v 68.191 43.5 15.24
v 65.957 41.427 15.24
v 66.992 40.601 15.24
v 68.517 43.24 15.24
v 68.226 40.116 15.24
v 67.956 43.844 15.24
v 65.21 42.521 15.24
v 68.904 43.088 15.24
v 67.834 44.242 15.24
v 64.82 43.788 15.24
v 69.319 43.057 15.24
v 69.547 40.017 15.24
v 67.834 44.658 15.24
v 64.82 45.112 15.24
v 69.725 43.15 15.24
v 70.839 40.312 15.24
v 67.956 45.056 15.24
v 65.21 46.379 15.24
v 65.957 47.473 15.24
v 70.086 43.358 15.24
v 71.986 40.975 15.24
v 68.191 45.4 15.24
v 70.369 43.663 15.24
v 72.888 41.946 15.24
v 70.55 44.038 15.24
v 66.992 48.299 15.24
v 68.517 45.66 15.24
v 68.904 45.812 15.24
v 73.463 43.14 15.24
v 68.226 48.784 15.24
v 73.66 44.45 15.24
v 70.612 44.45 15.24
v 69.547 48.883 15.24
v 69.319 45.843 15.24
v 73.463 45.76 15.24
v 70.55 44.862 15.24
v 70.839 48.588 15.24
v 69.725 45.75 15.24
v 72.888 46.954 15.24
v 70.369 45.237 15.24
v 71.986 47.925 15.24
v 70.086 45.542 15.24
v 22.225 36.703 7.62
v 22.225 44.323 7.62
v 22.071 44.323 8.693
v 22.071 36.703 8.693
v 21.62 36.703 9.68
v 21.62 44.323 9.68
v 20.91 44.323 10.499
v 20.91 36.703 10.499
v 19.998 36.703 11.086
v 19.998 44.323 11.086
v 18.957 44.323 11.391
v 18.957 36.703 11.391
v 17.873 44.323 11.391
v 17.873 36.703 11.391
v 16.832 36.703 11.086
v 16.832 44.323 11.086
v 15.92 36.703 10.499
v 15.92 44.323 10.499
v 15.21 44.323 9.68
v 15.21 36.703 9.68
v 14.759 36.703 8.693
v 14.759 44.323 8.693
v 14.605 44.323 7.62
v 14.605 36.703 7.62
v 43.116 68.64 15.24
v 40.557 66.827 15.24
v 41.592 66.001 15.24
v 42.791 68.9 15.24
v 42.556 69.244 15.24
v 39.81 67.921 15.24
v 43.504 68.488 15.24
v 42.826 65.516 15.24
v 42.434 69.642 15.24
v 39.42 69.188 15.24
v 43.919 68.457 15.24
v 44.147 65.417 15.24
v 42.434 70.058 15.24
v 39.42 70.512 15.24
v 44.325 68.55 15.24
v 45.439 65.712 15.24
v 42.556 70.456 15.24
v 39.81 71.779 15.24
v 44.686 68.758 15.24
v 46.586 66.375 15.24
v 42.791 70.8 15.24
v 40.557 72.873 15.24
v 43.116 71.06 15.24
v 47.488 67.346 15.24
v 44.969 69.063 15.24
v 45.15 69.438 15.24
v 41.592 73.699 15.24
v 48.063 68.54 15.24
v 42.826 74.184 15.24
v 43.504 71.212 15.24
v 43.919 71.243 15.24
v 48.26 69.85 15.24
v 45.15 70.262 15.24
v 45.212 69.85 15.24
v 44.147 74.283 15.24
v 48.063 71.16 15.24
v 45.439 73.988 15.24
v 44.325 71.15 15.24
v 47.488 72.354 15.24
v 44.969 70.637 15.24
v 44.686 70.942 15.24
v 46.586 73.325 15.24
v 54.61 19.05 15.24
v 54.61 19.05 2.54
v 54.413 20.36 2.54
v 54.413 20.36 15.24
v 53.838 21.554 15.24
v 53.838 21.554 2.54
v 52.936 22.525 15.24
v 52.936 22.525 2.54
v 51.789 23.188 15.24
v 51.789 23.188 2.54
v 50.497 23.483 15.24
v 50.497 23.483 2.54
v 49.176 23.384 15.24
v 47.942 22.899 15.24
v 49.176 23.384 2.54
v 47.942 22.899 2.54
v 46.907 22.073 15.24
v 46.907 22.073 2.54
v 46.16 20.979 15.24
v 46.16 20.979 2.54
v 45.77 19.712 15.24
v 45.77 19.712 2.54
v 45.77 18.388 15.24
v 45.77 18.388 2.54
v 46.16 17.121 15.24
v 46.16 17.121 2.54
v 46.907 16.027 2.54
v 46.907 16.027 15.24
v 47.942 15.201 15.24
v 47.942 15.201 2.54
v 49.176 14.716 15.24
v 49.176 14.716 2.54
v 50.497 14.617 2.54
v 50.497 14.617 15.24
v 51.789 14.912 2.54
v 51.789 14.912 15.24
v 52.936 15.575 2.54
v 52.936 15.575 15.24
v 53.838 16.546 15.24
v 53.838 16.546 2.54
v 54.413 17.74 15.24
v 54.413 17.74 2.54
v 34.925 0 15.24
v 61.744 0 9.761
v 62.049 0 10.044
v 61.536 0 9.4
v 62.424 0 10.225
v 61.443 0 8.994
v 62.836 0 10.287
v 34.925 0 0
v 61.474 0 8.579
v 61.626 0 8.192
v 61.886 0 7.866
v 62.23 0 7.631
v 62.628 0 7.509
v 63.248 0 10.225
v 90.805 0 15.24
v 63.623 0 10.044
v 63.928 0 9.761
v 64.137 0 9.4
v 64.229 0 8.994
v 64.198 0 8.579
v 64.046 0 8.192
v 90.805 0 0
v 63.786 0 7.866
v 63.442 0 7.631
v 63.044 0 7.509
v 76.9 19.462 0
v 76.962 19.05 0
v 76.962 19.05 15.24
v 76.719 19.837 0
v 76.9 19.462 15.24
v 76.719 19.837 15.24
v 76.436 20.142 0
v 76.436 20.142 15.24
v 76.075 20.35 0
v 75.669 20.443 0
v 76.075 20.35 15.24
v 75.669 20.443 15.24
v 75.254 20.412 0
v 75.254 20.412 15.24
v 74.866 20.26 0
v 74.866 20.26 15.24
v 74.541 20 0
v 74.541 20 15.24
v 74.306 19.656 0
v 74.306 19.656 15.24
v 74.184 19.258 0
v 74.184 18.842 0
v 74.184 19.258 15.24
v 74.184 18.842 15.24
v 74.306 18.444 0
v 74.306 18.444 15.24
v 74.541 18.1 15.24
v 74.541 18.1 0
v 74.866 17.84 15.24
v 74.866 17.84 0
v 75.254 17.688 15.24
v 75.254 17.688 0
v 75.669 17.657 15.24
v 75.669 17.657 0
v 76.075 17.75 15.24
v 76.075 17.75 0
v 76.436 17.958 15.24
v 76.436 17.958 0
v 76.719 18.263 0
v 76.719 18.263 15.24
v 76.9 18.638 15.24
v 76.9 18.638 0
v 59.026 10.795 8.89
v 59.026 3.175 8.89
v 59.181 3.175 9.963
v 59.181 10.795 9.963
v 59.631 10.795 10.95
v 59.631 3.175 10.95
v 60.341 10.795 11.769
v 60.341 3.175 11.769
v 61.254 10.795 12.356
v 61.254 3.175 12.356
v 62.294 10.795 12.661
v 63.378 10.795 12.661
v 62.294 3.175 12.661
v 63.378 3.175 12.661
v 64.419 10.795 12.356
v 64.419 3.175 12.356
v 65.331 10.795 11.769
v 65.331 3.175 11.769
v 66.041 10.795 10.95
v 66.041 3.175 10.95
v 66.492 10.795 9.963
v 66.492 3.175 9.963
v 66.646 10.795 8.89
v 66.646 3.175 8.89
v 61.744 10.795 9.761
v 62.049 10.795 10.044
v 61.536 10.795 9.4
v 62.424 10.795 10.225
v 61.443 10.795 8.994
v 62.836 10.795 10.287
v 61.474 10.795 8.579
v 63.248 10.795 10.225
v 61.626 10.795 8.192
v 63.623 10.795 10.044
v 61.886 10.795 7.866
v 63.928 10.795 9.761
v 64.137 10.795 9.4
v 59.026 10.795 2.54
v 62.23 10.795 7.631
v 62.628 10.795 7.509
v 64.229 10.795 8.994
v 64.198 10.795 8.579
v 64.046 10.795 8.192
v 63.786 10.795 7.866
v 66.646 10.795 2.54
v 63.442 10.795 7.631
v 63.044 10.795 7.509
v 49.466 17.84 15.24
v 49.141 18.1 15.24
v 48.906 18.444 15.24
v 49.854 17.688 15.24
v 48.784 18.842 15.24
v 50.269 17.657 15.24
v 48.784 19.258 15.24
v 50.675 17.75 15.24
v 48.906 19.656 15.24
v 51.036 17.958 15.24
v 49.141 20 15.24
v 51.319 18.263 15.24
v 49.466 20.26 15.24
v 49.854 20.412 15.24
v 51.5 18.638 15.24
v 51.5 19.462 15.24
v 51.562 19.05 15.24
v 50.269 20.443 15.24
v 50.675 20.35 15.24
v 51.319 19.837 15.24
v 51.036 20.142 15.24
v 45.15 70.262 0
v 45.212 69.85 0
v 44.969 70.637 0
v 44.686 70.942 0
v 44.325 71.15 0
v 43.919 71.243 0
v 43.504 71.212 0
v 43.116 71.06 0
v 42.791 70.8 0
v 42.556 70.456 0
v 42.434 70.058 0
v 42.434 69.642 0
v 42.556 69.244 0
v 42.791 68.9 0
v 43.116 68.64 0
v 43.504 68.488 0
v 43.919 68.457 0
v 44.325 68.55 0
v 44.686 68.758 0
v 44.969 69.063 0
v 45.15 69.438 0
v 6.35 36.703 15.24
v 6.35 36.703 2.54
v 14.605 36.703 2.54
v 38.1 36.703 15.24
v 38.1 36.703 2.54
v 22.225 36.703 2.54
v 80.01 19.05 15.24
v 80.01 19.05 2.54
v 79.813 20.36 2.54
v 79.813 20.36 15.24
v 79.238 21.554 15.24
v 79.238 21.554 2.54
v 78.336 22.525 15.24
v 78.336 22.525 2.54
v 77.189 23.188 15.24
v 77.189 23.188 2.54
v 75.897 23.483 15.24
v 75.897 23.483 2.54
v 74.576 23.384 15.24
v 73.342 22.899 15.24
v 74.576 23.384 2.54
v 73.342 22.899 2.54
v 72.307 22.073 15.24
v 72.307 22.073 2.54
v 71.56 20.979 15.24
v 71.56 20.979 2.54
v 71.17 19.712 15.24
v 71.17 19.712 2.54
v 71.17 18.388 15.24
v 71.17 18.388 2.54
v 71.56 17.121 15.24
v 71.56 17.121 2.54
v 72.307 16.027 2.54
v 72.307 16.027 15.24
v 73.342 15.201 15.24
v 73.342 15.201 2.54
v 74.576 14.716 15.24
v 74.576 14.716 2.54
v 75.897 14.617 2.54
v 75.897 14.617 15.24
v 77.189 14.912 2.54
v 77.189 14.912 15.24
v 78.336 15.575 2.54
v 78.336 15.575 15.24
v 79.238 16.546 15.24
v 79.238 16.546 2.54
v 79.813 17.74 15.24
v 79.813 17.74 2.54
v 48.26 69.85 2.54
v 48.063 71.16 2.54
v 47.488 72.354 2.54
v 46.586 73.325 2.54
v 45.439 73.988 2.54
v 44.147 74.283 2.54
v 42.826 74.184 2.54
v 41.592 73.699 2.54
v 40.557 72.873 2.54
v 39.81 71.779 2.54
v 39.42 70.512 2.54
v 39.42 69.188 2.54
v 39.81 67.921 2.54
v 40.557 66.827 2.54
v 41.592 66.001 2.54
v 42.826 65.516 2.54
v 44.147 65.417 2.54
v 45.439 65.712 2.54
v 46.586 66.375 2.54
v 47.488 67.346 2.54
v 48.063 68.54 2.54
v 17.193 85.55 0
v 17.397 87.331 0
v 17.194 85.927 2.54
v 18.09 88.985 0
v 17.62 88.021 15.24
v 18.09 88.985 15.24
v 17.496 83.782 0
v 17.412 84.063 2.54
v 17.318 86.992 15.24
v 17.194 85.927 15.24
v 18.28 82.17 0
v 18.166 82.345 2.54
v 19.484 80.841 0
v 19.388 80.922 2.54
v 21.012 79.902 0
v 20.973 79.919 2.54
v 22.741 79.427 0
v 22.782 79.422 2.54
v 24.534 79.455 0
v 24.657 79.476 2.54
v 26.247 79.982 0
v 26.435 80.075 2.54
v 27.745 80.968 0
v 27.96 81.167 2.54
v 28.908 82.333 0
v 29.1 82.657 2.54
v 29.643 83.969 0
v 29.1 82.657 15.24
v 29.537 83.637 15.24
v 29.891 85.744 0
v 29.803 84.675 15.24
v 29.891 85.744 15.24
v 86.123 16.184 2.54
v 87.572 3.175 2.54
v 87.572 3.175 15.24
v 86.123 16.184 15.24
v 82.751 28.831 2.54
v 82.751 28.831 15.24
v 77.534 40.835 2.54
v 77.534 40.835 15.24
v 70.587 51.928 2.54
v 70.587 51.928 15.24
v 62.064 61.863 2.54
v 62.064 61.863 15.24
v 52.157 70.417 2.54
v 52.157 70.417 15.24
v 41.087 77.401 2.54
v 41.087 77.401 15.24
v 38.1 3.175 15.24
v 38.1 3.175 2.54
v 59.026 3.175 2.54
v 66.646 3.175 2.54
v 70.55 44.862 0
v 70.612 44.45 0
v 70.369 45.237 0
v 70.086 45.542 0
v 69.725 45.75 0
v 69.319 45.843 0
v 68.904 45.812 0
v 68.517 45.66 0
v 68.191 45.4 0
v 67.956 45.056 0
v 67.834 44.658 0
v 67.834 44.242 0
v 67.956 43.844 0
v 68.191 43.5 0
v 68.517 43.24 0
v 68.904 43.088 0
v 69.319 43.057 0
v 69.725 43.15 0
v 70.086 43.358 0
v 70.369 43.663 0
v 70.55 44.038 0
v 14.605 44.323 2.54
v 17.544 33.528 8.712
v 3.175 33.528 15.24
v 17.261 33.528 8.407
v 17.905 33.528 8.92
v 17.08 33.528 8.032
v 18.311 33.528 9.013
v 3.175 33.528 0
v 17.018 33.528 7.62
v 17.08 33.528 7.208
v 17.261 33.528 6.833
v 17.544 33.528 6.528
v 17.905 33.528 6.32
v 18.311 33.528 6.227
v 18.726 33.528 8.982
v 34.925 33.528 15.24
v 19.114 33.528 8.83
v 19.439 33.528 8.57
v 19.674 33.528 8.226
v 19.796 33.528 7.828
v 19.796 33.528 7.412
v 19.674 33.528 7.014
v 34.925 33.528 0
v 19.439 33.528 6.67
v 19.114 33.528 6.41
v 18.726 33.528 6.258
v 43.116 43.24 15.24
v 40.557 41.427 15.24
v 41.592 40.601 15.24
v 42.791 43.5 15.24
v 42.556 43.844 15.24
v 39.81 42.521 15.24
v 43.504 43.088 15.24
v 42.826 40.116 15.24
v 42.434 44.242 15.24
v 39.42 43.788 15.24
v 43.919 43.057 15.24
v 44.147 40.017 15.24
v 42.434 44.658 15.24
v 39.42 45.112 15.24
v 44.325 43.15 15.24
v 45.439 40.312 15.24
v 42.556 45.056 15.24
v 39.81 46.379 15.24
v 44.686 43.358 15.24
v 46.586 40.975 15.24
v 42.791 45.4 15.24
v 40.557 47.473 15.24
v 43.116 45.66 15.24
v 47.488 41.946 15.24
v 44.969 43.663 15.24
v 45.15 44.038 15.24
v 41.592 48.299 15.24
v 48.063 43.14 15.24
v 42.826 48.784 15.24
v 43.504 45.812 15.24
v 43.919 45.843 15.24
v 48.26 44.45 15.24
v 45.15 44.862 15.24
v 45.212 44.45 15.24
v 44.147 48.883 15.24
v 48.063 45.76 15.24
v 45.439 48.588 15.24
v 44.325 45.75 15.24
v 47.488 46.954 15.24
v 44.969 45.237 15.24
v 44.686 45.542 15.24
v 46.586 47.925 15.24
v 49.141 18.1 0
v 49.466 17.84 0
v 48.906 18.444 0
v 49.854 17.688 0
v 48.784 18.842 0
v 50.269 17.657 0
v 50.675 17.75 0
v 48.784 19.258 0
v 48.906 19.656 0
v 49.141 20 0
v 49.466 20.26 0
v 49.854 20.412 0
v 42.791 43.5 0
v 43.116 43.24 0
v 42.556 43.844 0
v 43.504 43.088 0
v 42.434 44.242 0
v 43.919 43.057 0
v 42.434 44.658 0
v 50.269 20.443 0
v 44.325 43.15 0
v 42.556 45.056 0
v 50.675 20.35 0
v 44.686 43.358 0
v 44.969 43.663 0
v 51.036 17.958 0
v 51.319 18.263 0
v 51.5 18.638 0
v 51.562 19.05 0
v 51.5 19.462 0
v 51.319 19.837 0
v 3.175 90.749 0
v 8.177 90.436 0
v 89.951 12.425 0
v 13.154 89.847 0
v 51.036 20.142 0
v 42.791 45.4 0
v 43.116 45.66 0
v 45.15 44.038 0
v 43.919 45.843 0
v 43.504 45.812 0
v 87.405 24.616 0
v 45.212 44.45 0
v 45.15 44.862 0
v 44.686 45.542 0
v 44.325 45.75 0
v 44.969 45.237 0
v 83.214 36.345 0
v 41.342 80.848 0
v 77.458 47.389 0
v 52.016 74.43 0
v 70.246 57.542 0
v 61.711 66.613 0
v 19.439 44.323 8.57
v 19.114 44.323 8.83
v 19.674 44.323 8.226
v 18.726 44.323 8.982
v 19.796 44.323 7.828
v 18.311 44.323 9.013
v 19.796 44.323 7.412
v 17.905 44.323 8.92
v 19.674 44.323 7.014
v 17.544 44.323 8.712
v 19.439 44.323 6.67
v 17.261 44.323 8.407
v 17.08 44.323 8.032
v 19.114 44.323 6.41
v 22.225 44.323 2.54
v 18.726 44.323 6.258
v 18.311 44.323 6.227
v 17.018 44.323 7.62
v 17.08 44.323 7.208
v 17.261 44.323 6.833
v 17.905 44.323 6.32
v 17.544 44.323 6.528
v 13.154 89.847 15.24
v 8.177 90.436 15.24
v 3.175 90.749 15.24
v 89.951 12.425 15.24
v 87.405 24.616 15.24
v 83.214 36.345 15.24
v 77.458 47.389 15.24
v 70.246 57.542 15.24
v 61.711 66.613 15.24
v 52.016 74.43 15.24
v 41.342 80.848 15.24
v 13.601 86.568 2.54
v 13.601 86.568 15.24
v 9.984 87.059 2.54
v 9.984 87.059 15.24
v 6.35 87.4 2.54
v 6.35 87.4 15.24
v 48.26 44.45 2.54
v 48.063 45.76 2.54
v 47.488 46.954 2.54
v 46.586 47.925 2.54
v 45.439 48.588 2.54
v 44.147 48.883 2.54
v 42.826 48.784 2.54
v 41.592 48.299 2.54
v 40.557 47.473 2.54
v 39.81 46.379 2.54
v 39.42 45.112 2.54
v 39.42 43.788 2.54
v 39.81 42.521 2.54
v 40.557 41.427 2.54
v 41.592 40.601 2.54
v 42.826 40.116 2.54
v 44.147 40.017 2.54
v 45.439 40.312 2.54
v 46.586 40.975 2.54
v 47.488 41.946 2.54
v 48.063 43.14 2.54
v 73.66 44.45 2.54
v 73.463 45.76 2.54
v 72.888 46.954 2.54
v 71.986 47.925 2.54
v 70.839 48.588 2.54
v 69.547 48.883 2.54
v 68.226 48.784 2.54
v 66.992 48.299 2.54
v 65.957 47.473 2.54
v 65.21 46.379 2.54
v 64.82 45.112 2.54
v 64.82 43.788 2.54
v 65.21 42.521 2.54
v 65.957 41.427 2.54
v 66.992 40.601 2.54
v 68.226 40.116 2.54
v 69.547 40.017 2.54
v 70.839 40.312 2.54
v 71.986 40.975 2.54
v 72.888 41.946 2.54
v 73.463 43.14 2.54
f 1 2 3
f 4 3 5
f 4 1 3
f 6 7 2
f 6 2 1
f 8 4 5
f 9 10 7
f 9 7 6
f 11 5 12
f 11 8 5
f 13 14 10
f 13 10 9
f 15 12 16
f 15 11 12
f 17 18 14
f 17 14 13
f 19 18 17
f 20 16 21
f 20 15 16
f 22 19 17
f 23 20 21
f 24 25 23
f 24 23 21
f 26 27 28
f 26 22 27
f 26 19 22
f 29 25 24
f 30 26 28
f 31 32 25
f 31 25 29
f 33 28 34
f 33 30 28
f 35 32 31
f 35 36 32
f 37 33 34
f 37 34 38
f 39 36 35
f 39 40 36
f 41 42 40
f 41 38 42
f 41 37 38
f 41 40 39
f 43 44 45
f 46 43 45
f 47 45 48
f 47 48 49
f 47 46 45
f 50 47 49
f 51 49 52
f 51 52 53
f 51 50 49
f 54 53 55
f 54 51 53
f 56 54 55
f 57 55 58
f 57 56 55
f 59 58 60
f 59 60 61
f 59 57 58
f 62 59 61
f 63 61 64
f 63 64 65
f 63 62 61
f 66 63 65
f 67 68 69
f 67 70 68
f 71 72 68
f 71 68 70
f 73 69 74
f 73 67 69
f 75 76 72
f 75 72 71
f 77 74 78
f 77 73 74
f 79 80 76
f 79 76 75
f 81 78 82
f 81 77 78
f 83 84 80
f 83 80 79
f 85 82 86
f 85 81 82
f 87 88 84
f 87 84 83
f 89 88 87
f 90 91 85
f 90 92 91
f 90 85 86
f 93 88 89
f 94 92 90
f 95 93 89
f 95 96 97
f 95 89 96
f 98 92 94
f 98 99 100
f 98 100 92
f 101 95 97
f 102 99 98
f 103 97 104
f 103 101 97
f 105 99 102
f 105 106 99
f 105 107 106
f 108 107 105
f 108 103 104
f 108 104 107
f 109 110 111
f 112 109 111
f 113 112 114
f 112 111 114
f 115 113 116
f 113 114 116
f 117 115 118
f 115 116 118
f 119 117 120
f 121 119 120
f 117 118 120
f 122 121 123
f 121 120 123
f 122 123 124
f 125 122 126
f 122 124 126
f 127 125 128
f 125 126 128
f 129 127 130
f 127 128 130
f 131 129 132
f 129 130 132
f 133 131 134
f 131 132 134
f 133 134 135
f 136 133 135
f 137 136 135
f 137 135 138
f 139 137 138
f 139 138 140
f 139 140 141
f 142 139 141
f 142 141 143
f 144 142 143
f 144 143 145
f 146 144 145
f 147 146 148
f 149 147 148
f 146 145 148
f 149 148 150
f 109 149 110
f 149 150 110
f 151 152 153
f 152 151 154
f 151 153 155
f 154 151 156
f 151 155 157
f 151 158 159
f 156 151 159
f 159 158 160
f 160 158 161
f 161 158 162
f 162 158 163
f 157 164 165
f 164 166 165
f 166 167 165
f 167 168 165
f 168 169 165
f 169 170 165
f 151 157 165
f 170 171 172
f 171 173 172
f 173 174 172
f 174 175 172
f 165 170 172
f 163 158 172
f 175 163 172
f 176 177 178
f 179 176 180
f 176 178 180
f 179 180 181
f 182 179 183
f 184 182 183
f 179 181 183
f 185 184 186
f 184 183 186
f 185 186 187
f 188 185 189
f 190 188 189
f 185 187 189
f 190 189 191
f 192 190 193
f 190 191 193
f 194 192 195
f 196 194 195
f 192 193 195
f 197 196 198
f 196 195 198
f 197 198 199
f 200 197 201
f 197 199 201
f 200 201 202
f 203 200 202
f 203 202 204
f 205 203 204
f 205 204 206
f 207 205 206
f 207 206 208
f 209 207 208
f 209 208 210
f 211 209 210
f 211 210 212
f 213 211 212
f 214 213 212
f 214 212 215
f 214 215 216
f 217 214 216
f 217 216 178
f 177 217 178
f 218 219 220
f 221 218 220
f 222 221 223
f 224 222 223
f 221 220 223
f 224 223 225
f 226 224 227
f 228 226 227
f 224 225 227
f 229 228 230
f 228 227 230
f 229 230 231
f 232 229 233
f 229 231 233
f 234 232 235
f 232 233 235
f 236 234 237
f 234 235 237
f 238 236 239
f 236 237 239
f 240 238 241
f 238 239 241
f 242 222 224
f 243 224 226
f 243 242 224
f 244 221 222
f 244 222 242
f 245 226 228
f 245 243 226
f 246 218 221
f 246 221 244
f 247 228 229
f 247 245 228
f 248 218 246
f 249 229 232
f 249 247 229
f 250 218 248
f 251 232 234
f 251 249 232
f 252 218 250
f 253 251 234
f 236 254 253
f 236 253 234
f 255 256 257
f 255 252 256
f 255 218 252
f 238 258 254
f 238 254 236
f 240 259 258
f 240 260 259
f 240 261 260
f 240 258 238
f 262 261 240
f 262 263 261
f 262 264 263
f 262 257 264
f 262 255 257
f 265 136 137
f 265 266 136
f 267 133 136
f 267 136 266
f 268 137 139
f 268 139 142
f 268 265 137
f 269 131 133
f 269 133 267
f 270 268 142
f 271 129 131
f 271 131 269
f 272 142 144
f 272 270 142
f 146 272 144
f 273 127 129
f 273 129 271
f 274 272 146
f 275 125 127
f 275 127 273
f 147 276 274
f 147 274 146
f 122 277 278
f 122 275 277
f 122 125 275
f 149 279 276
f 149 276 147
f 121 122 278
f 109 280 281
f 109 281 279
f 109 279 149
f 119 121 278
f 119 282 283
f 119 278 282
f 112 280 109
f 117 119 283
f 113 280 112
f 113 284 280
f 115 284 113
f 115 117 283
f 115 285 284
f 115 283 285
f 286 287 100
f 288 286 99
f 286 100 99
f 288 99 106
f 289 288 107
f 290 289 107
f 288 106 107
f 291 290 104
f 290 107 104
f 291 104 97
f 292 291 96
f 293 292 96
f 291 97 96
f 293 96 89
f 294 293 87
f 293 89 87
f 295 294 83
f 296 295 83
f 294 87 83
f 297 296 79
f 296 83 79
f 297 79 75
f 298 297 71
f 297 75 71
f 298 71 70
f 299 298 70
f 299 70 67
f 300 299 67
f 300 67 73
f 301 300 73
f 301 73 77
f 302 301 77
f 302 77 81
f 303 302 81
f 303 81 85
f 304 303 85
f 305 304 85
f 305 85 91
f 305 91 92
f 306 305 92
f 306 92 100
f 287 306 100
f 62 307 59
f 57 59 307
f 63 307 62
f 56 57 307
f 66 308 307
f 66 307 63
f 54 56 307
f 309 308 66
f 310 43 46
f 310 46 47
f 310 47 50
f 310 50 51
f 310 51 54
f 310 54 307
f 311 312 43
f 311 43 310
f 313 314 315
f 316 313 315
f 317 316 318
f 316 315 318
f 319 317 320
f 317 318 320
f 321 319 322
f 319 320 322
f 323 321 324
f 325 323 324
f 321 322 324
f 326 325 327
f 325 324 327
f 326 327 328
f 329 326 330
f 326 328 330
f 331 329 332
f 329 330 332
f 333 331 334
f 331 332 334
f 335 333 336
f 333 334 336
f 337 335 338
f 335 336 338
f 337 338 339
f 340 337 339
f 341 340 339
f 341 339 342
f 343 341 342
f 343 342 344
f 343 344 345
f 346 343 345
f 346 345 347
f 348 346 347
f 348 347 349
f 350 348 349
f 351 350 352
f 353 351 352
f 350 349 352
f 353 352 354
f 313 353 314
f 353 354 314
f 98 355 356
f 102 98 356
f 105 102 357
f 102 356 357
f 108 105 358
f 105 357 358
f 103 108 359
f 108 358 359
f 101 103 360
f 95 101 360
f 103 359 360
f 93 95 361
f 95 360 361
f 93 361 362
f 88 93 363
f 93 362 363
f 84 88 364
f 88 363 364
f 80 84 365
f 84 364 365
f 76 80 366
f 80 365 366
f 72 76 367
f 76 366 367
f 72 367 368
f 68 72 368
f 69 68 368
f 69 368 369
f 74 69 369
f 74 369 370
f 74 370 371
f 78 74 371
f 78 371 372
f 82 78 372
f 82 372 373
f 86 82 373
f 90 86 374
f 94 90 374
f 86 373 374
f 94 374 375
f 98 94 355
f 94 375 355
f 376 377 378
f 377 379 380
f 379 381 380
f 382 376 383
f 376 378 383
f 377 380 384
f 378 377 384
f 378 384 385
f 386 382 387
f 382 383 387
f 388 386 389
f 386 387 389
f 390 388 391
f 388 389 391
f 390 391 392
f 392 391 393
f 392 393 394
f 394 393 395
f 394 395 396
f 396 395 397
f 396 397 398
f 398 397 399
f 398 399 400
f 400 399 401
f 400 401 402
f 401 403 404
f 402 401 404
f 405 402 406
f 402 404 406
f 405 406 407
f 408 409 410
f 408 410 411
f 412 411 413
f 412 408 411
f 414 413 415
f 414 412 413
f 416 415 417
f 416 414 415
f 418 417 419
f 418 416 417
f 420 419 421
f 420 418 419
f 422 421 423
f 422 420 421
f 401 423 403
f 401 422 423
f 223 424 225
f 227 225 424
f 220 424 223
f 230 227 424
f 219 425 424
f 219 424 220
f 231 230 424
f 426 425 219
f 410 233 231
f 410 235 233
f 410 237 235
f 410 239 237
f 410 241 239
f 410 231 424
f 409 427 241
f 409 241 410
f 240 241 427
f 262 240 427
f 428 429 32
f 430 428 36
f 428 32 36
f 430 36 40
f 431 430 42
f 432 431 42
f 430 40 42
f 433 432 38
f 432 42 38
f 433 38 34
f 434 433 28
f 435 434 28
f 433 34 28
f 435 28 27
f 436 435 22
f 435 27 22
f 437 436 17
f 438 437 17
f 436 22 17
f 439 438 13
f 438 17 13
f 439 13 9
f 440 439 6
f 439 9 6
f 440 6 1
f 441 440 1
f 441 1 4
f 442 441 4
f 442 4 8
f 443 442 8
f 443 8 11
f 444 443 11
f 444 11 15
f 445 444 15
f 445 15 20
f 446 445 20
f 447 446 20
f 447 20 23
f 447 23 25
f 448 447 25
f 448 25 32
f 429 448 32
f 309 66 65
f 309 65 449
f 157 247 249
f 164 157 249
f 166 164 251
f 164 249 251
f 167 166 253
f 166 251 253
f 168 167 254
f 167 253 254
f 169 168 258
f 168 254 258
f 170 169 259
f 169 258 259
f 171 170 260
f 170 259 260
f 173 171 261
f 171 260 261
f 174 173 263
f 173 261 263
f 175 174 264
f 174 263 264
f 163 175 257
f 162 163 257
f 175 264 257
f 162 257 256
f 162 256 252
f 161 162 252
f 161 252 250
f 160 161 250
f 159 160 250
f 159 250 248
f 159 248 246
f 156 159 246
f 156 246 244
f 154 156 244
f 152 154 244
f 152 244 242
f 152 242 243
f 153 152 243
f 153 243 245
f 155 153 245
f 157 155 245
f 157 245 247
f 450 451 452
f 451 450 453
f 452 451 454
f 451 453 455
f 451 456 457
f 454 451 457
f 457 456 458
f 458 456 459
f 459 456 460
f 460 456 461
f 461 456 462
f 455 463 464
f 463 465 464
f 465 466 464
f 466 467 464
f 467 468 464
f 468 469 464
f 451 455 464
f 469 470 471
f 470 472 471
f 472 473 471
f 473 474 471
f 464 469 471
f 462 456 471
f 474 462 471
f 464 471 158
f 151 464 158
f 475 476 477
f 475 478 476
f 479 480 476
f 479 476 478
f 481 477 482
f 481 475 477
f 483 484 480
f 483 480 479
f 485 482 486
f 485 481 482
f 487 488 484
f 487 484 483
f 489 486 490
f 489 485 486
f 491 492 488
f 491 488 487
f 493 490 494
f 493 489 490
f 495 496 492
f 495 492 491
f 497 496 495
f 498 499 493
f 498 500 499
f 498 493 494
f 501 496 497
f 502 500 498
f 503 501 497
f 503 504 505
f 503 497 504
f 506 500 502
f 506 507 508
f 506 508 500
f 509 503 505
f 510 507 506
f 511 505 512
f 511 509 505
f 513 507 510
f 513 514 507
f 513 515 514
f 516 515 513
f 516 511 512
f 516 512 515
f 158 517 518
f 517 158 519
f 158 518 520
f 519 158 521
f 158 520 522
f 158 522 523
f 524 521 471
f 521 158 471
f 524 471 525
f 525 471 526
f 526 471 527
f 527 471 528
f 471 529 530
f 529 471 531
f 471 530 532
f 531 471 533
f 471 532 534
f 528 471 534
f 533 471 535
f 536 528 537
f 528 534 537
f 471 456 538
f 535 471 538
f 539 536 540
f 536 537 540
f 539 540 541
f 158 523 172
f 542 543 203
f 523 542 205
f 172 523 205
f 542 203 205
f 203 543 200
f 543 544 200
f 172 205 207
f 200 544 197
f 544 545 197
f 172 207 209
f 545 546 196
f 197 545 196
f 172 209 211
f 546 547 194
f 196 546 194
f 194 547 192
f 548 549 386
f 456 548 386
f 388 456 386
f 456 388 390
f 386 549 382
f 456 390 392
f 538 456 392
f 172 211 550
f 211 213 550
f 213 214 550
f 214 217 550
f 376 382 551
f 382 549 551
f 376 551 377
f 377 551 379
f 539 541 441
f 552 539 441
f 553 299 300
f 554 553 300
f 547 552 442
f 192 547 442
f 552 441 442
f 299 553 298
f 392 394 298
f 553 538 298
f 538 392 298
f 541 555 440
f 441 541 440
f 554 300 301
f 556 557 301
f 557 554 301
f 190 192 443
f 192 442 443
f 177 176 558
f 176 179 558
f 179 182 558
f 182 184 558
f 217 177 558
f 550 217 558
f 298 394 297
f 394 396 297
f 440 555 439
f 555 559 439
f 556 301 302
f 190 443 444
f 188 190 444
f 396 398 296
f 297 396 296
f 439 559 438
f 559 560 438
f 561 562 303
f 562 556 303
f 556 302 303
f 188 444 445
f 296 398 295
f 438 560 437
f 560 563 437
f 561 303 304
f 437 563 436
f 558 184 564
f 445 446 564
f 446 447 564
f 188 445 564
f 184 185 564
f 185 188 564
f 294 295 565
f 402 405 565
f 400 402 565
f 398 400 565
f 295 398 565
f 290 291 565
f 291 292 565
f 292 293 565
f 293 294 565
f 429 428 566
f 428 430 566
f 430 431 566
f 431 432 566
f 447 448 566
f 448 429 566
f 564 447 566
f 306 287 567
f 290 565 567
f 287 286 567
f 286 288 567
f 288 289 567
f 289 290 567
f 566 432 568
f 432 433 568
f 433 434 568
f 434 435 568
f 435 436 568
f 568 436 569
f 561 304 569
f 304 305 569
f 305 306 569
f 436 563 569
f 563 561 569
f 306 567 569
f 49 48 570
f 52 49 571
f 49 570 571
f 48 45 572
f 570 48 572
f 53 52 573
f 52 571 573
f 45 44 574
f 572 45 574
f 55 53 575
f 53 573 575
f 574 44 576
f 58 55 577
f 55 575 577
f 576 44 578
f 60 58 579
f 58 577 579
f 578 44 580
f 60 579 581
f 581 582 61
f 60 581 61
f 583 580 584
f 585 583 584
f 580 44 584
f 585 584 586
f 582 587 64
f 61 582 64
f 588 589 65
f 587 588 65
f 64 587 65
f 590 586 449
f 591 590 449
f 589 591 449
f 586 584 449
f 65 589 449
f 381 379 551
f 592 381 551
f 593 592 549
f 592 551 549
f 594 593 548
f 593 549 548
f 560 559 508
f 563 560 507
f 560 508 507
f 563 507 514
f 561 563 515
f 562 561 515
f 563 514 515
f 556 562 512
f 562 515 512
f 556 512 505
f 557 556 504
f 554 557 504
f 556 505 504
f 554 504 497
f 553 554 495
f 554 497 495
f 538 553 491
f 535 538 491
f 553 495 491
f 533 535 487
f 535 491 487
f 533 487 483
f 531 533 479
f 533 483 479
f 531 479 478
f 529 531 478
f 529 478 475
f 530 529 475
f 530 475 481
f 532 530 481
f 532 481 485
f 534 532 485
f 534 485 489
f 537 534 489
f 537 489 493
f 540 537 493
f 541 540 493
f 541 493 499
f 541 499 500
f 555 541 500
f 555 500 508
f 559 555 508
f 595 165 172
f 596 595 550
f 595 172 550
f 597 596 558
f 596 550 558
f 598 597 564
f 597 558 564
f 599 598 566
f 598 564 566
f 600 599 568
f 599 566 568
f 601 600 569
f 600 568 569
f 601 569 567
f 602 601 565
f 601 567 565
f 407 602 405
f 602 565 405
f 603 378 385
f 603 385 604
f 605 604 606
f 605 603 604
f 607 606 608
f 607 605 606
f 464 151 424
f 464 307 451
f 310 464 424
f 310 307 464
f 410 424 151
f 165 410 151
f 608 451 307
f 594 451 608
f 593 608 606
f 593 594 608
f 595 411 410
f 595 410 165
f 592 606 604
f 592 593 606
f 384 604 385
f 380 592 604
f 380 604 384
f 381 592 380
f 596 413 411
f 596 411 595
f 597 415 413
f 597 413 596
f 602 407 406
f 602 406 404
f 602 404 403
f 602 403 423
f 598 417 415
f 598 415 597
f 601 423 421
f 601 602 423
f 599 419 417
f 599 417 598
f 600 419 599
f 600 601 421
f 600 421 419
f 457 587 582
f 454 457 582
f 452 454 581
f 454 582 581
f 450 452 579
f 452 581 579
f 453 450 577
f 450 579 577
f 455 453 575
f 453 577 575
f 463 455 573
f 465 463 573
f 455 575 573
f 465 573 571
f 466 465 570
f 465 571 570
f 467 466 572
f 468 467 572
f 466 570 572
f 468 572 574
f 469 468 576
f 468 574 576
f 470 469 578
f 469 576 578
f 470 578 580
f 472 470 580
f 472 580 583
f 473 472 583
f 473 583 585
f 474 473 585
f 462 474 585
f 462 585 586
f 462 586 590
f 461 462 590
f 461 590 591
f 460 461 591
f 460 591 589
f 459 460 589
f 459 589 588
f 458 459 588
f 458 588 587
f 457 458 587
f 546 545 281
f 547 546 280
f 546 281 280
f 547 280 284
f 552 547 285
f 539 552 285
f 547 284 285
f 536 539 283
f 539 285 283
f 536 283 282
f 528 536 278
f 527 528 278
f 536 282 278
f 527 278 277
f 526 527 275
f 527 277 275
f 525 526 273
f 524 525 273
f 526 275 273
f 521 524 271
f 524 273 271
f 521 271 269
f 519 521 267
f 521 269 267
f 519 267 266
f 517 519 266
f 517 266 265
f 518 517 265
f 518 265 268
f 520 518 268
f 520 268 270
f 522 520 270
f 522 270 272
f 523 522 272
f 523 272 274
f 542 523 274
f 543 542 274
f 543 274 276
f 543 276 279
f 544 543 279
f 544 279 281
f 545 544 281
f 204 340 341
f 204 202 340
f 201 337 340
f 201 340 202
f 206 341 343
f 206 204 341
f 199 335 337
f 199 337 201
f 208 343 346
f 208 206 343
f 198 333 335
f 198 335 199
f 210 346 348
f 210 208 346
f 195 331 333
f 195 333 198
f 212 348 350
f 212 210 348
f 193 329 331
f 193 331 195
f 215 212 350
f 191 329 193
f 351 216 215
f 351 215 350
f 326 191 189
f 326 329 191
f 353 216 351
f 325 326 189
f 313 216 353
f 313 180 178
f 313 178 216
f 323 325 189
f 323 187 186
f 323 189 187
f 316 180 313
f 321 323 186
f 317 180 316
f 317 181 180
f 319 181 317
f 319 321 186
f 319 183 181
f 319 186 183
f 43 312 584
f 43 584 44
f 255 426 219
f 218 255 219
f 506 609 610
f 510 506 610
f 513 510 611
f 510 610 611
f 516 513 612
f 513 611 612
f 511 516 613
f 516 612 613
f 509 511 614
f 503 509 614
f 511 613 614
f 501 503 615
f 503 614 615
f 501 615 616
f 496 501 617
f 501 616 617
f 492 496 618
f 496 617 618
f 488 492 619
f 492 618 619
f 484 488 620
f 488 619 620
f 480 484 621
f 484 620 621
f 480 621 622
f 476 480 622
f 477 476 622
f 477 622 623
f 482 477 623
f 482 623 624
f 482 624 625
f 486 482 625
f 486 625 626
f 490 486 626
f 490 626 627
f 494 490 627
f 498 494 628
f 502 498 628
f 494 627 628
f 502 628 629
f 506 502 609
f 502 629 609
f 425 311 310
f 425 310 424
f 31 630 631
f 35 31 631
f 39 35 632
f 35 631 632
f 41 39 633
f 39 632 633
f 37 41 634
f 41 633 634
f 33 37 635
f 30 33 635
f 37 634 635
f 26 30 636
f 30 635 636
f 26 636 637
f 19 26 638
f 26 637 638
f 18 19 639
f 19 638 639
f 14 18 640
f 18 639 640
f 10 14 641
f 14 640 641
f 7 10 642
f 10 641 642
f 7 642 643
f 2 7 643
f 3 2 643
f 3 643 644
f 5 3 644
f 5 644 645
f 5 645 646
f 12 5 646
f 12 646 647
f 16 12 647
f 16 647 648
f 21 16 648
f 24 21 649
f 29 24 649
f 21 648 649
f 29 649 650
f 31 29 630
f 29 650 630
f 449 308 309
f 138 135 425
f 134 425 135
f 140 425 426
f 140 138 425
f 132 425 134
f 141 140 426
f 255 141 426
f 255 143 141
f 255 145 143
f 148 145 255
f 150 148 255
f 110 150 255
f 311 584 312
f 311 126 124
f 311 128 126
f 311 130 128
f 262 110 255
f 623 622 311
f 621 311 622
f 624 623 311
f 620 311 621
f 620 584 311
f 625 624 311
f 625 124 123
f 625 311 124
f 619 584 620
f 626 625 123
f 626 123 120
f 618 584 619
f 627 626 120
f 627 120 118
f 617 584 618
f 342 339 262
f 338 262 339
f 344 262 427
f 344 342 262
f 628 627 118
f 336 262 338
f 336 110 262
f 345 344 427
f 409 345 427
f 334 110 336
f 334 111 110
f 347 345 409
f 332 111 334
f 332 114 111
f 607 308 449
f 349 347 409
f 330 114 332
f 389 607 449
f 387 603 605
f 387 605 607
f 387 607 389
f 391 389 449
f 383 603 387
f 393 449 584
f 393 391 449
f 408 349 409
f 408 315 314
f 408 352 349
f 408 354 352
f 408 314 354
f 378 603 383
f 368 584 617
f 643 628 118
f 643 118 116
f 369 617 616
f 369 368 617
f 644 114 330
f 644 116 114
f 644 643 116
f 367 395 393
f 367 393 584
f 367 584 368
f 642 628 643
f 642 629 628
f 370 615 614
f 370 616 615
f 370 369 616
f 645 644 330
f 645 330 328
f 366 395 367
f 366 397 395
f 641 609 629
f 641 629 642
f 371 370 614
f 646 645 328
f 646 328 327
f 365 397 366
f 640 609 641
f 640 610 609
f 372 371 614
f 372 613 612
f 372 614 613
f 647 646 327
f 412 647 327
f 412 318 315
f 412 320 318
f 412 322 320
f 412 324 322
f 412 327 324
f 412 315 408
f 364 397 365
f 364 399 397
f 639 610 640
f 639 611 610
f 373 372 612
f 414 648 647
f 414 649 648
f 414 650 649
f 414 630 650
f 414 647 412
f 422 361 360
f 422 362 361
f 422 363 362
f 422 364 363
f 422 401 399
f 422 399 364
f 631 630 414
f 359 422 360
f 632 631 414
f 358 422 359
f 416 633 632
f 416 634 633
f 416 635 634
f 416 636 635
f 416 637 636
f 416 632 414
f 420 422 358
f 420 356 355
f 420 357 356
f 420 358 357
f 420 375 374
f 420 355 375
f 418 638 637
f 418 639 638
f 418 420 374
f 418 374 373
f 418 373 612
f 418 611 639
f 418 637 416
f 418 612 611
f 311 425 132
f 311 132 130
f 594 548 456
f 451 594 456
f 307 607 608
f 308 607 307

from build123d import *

# Parameters (mm, degrees)
BOSS_EXTRUDE1_DEPTH = 2.54
BOSS_EXTRUDE2_DEPTH = 12.7
BOSS_EXTRUDE3_DEPTH = 7.62
SKETCH5_R           = 1.397
CUT_EXTRUDE1_DEPTH  = 104.117521798
SKETCH6_R           = 4.445
BOSS_EXTRUDE4_DEPTH = 12.7
SKETCH7_R           = 6.35
CUT_EXTRUDE2_DEPTH  = 130.279824509
SKETCH8_R           = 1.397
CUT_EXTRUDE3_DEPTH  = 130.279824509
BOSS_EXTRUDE5_DEPTH = 7.62
SKETCH10_R          = 1.397
CUT_EXTRUDE4_DEPTH  = 122.944757421


with BuildPart() as part:
    # Sketch2 → Boss-Extrude1 (new body)
    with BuildSketch(Plane.XY):
        with BuildLine():
            Line((34.925, 0), (90.805, 0))
            ThreePointArc((90.805, 0), (65.321718823, 63.07631152), (3.175, 90.749476032))
            Line((3.175, 90.749476032), (3.175, 33.528))
            Line((3.175, 33.528), (34.925, 33.528))
            Line((34.925, 33.528), (34.925, 0))
        make_face()
    extrude(amount=BOSS_EXTRUDE1_DEPTH)

    # Sketch3 → Boss-Extrude2 (add)
    with BuildSketch(Plane.XY.offset(2.54)):
        with BuildLine():
            Line((34.925, 33.528), (34.925, 0))
            Line((34.925, 0), (90.805, 0))
            ThreePointArc((90.805, 0), (65.321718823, 63.07631152), (3.175, 90.749476032))
            Line((3.175, 90.749476032), (3.175, 33.528))
            Line((3.175, 33.528), (34.925, 33.528))
        make_face()
        with BuildLine():
            Line((6.35, 36.703), (38.1, 36.703))
            Line((38.1, 36.703), (38.1, 3.175))
            Line((38.1, 3.175), (87.572462995, 3.175))
            ThreePointArc((87.572462995, 3.175), (63.077762451, 60.829374353), (6.35, 87.399624713))
            Line((6.35, 87.399624713), (6.35, 36.703))
        make_face(mode=Mode.SUBTRACT)
    extrude(amount=BOSS_EXTRUDE2_DEPTH)

    # Sketch4 → Boss-Extrude3 (add)
    with BuildSketch(Plane(origin=(0, 36.703, 0), x_dir=(1, 0, 0), z_dir=(0, 1, 0))):
        with BuildLine():
            Line((14.605, -7.62), (14.605, 0))
            Line((14.605, 0), (22.225, 0))
            Line((22.225, 0), (22.225, -7.62))
            ThreePointArc((22.225, -7.62), (18.415, -11.43), (14.605, -7.62))
        make_face()
    extrude(amount=BOSS_EXTRUDE3_DEPTH)

    # Sketch5 → Cut-Extrude1 (cut, through all)
    with BuildSketch(Plane(origin=(0, 44.323, 0), x_dir=(1, 0, 0), z_dir=(0, 1, 0))):
        with Locations(Location((18.415, -7.62, 0), (0, 0, 180))):
            Circle(SKETCH5_R)
    extrude(amount=-CUT_EXTRUDE1_DEPTH, mode=Mode.SUBTRACT)

    # Sketch6 → Boss-Extrude4 (add)
    with BuildSketch(Plane.XY.offset(2.54)):
        with Locations((43.815, 44.45)):
            Circle(SKETCH6_R)
        with Locations((43.815, 69.85)):
            Circle(SKETCH6_R)
        with Locations((50.165, 19.05)):
            Circle(SKETCH6_R)
        with Locations((75.565, 19.05)):
            Circle(SKETCH6_R)
        with Locations((69.215, 44.45)):
            Circle(SKETCH6_R)
    extrude(amount=BOSS_EXTRUDE4_DEPTH)

    # Sketch7 → Cut-Extrude2 (cut, through all)
    with BuildSketch(Plane.XY.offset(15.24)):
        with Locations((23.540776994, 85.726552587)):
            Circle(SKETCH7_R)
    extrude(amount=-CUT_EXTRUDE2_DEPTH, mode=Mode.SUBTRACT)

    # Sketch8 → Cut-Extrude3 (cut, through all)
    with BuildSketch(Plane.XY.offset(15.24)):
        with Locations((43.815, 69.85)):
            Circle(SKETCH8_R)
        with Locations((43.815, 44.45)):
            Circle(SKETCH8_R)
        with Locations((69.215, 44.45)):
            Circle(SKETCH8_R)
        with Locations((75.565, 19.05)):
            Circle(SKETCH8_R)
        with Locations((50.165, 19.05)):
            Circle(SKETCH8_R)
    extrude(amount=-CUT_EXTRUDE3_DEPTH, mode=Mode.SUBTRACT)

    # Sketch9 → Boss-Extrude5 (add)
    with BuildSketch(Plane(origin=(0, 3.175, 0), x_dir=(1, 0, 0), z_dir=(0, 1, 0))):
        with BuildLine():
            Line((66.646231497, -8.89), (66.646231497, -2.54))
            Line((66.646231497, -2.54), (59.026231497, -2.54))
            Line((59.026231497, -2.54), (59.026231497, -8.89))
            ThreePointArc((59.026231497, -8.89), (62.836231497, -12.7), (66.646231497, -8.89))
        make_face()
    extrude(amount=BOSS_EXTRUDE5_DEPTH)

    # Sketch10 → Cut-Extrude4 (cut, through all)
    with BuildSketch(Plane(origin=(0, 10.795, 0), x_dir=(1, 0, 0), z_dir=(0, 1, 0))):
        with Locations(Location((62.836231497, -8.89, 0), (0, 0, 270))):
            Circle(SKETCH10_R)
    extrude(amount=-CUT_EXTRUDE4_DEPTH, mode=Mode.SUBTRACT)


solid = part.part
